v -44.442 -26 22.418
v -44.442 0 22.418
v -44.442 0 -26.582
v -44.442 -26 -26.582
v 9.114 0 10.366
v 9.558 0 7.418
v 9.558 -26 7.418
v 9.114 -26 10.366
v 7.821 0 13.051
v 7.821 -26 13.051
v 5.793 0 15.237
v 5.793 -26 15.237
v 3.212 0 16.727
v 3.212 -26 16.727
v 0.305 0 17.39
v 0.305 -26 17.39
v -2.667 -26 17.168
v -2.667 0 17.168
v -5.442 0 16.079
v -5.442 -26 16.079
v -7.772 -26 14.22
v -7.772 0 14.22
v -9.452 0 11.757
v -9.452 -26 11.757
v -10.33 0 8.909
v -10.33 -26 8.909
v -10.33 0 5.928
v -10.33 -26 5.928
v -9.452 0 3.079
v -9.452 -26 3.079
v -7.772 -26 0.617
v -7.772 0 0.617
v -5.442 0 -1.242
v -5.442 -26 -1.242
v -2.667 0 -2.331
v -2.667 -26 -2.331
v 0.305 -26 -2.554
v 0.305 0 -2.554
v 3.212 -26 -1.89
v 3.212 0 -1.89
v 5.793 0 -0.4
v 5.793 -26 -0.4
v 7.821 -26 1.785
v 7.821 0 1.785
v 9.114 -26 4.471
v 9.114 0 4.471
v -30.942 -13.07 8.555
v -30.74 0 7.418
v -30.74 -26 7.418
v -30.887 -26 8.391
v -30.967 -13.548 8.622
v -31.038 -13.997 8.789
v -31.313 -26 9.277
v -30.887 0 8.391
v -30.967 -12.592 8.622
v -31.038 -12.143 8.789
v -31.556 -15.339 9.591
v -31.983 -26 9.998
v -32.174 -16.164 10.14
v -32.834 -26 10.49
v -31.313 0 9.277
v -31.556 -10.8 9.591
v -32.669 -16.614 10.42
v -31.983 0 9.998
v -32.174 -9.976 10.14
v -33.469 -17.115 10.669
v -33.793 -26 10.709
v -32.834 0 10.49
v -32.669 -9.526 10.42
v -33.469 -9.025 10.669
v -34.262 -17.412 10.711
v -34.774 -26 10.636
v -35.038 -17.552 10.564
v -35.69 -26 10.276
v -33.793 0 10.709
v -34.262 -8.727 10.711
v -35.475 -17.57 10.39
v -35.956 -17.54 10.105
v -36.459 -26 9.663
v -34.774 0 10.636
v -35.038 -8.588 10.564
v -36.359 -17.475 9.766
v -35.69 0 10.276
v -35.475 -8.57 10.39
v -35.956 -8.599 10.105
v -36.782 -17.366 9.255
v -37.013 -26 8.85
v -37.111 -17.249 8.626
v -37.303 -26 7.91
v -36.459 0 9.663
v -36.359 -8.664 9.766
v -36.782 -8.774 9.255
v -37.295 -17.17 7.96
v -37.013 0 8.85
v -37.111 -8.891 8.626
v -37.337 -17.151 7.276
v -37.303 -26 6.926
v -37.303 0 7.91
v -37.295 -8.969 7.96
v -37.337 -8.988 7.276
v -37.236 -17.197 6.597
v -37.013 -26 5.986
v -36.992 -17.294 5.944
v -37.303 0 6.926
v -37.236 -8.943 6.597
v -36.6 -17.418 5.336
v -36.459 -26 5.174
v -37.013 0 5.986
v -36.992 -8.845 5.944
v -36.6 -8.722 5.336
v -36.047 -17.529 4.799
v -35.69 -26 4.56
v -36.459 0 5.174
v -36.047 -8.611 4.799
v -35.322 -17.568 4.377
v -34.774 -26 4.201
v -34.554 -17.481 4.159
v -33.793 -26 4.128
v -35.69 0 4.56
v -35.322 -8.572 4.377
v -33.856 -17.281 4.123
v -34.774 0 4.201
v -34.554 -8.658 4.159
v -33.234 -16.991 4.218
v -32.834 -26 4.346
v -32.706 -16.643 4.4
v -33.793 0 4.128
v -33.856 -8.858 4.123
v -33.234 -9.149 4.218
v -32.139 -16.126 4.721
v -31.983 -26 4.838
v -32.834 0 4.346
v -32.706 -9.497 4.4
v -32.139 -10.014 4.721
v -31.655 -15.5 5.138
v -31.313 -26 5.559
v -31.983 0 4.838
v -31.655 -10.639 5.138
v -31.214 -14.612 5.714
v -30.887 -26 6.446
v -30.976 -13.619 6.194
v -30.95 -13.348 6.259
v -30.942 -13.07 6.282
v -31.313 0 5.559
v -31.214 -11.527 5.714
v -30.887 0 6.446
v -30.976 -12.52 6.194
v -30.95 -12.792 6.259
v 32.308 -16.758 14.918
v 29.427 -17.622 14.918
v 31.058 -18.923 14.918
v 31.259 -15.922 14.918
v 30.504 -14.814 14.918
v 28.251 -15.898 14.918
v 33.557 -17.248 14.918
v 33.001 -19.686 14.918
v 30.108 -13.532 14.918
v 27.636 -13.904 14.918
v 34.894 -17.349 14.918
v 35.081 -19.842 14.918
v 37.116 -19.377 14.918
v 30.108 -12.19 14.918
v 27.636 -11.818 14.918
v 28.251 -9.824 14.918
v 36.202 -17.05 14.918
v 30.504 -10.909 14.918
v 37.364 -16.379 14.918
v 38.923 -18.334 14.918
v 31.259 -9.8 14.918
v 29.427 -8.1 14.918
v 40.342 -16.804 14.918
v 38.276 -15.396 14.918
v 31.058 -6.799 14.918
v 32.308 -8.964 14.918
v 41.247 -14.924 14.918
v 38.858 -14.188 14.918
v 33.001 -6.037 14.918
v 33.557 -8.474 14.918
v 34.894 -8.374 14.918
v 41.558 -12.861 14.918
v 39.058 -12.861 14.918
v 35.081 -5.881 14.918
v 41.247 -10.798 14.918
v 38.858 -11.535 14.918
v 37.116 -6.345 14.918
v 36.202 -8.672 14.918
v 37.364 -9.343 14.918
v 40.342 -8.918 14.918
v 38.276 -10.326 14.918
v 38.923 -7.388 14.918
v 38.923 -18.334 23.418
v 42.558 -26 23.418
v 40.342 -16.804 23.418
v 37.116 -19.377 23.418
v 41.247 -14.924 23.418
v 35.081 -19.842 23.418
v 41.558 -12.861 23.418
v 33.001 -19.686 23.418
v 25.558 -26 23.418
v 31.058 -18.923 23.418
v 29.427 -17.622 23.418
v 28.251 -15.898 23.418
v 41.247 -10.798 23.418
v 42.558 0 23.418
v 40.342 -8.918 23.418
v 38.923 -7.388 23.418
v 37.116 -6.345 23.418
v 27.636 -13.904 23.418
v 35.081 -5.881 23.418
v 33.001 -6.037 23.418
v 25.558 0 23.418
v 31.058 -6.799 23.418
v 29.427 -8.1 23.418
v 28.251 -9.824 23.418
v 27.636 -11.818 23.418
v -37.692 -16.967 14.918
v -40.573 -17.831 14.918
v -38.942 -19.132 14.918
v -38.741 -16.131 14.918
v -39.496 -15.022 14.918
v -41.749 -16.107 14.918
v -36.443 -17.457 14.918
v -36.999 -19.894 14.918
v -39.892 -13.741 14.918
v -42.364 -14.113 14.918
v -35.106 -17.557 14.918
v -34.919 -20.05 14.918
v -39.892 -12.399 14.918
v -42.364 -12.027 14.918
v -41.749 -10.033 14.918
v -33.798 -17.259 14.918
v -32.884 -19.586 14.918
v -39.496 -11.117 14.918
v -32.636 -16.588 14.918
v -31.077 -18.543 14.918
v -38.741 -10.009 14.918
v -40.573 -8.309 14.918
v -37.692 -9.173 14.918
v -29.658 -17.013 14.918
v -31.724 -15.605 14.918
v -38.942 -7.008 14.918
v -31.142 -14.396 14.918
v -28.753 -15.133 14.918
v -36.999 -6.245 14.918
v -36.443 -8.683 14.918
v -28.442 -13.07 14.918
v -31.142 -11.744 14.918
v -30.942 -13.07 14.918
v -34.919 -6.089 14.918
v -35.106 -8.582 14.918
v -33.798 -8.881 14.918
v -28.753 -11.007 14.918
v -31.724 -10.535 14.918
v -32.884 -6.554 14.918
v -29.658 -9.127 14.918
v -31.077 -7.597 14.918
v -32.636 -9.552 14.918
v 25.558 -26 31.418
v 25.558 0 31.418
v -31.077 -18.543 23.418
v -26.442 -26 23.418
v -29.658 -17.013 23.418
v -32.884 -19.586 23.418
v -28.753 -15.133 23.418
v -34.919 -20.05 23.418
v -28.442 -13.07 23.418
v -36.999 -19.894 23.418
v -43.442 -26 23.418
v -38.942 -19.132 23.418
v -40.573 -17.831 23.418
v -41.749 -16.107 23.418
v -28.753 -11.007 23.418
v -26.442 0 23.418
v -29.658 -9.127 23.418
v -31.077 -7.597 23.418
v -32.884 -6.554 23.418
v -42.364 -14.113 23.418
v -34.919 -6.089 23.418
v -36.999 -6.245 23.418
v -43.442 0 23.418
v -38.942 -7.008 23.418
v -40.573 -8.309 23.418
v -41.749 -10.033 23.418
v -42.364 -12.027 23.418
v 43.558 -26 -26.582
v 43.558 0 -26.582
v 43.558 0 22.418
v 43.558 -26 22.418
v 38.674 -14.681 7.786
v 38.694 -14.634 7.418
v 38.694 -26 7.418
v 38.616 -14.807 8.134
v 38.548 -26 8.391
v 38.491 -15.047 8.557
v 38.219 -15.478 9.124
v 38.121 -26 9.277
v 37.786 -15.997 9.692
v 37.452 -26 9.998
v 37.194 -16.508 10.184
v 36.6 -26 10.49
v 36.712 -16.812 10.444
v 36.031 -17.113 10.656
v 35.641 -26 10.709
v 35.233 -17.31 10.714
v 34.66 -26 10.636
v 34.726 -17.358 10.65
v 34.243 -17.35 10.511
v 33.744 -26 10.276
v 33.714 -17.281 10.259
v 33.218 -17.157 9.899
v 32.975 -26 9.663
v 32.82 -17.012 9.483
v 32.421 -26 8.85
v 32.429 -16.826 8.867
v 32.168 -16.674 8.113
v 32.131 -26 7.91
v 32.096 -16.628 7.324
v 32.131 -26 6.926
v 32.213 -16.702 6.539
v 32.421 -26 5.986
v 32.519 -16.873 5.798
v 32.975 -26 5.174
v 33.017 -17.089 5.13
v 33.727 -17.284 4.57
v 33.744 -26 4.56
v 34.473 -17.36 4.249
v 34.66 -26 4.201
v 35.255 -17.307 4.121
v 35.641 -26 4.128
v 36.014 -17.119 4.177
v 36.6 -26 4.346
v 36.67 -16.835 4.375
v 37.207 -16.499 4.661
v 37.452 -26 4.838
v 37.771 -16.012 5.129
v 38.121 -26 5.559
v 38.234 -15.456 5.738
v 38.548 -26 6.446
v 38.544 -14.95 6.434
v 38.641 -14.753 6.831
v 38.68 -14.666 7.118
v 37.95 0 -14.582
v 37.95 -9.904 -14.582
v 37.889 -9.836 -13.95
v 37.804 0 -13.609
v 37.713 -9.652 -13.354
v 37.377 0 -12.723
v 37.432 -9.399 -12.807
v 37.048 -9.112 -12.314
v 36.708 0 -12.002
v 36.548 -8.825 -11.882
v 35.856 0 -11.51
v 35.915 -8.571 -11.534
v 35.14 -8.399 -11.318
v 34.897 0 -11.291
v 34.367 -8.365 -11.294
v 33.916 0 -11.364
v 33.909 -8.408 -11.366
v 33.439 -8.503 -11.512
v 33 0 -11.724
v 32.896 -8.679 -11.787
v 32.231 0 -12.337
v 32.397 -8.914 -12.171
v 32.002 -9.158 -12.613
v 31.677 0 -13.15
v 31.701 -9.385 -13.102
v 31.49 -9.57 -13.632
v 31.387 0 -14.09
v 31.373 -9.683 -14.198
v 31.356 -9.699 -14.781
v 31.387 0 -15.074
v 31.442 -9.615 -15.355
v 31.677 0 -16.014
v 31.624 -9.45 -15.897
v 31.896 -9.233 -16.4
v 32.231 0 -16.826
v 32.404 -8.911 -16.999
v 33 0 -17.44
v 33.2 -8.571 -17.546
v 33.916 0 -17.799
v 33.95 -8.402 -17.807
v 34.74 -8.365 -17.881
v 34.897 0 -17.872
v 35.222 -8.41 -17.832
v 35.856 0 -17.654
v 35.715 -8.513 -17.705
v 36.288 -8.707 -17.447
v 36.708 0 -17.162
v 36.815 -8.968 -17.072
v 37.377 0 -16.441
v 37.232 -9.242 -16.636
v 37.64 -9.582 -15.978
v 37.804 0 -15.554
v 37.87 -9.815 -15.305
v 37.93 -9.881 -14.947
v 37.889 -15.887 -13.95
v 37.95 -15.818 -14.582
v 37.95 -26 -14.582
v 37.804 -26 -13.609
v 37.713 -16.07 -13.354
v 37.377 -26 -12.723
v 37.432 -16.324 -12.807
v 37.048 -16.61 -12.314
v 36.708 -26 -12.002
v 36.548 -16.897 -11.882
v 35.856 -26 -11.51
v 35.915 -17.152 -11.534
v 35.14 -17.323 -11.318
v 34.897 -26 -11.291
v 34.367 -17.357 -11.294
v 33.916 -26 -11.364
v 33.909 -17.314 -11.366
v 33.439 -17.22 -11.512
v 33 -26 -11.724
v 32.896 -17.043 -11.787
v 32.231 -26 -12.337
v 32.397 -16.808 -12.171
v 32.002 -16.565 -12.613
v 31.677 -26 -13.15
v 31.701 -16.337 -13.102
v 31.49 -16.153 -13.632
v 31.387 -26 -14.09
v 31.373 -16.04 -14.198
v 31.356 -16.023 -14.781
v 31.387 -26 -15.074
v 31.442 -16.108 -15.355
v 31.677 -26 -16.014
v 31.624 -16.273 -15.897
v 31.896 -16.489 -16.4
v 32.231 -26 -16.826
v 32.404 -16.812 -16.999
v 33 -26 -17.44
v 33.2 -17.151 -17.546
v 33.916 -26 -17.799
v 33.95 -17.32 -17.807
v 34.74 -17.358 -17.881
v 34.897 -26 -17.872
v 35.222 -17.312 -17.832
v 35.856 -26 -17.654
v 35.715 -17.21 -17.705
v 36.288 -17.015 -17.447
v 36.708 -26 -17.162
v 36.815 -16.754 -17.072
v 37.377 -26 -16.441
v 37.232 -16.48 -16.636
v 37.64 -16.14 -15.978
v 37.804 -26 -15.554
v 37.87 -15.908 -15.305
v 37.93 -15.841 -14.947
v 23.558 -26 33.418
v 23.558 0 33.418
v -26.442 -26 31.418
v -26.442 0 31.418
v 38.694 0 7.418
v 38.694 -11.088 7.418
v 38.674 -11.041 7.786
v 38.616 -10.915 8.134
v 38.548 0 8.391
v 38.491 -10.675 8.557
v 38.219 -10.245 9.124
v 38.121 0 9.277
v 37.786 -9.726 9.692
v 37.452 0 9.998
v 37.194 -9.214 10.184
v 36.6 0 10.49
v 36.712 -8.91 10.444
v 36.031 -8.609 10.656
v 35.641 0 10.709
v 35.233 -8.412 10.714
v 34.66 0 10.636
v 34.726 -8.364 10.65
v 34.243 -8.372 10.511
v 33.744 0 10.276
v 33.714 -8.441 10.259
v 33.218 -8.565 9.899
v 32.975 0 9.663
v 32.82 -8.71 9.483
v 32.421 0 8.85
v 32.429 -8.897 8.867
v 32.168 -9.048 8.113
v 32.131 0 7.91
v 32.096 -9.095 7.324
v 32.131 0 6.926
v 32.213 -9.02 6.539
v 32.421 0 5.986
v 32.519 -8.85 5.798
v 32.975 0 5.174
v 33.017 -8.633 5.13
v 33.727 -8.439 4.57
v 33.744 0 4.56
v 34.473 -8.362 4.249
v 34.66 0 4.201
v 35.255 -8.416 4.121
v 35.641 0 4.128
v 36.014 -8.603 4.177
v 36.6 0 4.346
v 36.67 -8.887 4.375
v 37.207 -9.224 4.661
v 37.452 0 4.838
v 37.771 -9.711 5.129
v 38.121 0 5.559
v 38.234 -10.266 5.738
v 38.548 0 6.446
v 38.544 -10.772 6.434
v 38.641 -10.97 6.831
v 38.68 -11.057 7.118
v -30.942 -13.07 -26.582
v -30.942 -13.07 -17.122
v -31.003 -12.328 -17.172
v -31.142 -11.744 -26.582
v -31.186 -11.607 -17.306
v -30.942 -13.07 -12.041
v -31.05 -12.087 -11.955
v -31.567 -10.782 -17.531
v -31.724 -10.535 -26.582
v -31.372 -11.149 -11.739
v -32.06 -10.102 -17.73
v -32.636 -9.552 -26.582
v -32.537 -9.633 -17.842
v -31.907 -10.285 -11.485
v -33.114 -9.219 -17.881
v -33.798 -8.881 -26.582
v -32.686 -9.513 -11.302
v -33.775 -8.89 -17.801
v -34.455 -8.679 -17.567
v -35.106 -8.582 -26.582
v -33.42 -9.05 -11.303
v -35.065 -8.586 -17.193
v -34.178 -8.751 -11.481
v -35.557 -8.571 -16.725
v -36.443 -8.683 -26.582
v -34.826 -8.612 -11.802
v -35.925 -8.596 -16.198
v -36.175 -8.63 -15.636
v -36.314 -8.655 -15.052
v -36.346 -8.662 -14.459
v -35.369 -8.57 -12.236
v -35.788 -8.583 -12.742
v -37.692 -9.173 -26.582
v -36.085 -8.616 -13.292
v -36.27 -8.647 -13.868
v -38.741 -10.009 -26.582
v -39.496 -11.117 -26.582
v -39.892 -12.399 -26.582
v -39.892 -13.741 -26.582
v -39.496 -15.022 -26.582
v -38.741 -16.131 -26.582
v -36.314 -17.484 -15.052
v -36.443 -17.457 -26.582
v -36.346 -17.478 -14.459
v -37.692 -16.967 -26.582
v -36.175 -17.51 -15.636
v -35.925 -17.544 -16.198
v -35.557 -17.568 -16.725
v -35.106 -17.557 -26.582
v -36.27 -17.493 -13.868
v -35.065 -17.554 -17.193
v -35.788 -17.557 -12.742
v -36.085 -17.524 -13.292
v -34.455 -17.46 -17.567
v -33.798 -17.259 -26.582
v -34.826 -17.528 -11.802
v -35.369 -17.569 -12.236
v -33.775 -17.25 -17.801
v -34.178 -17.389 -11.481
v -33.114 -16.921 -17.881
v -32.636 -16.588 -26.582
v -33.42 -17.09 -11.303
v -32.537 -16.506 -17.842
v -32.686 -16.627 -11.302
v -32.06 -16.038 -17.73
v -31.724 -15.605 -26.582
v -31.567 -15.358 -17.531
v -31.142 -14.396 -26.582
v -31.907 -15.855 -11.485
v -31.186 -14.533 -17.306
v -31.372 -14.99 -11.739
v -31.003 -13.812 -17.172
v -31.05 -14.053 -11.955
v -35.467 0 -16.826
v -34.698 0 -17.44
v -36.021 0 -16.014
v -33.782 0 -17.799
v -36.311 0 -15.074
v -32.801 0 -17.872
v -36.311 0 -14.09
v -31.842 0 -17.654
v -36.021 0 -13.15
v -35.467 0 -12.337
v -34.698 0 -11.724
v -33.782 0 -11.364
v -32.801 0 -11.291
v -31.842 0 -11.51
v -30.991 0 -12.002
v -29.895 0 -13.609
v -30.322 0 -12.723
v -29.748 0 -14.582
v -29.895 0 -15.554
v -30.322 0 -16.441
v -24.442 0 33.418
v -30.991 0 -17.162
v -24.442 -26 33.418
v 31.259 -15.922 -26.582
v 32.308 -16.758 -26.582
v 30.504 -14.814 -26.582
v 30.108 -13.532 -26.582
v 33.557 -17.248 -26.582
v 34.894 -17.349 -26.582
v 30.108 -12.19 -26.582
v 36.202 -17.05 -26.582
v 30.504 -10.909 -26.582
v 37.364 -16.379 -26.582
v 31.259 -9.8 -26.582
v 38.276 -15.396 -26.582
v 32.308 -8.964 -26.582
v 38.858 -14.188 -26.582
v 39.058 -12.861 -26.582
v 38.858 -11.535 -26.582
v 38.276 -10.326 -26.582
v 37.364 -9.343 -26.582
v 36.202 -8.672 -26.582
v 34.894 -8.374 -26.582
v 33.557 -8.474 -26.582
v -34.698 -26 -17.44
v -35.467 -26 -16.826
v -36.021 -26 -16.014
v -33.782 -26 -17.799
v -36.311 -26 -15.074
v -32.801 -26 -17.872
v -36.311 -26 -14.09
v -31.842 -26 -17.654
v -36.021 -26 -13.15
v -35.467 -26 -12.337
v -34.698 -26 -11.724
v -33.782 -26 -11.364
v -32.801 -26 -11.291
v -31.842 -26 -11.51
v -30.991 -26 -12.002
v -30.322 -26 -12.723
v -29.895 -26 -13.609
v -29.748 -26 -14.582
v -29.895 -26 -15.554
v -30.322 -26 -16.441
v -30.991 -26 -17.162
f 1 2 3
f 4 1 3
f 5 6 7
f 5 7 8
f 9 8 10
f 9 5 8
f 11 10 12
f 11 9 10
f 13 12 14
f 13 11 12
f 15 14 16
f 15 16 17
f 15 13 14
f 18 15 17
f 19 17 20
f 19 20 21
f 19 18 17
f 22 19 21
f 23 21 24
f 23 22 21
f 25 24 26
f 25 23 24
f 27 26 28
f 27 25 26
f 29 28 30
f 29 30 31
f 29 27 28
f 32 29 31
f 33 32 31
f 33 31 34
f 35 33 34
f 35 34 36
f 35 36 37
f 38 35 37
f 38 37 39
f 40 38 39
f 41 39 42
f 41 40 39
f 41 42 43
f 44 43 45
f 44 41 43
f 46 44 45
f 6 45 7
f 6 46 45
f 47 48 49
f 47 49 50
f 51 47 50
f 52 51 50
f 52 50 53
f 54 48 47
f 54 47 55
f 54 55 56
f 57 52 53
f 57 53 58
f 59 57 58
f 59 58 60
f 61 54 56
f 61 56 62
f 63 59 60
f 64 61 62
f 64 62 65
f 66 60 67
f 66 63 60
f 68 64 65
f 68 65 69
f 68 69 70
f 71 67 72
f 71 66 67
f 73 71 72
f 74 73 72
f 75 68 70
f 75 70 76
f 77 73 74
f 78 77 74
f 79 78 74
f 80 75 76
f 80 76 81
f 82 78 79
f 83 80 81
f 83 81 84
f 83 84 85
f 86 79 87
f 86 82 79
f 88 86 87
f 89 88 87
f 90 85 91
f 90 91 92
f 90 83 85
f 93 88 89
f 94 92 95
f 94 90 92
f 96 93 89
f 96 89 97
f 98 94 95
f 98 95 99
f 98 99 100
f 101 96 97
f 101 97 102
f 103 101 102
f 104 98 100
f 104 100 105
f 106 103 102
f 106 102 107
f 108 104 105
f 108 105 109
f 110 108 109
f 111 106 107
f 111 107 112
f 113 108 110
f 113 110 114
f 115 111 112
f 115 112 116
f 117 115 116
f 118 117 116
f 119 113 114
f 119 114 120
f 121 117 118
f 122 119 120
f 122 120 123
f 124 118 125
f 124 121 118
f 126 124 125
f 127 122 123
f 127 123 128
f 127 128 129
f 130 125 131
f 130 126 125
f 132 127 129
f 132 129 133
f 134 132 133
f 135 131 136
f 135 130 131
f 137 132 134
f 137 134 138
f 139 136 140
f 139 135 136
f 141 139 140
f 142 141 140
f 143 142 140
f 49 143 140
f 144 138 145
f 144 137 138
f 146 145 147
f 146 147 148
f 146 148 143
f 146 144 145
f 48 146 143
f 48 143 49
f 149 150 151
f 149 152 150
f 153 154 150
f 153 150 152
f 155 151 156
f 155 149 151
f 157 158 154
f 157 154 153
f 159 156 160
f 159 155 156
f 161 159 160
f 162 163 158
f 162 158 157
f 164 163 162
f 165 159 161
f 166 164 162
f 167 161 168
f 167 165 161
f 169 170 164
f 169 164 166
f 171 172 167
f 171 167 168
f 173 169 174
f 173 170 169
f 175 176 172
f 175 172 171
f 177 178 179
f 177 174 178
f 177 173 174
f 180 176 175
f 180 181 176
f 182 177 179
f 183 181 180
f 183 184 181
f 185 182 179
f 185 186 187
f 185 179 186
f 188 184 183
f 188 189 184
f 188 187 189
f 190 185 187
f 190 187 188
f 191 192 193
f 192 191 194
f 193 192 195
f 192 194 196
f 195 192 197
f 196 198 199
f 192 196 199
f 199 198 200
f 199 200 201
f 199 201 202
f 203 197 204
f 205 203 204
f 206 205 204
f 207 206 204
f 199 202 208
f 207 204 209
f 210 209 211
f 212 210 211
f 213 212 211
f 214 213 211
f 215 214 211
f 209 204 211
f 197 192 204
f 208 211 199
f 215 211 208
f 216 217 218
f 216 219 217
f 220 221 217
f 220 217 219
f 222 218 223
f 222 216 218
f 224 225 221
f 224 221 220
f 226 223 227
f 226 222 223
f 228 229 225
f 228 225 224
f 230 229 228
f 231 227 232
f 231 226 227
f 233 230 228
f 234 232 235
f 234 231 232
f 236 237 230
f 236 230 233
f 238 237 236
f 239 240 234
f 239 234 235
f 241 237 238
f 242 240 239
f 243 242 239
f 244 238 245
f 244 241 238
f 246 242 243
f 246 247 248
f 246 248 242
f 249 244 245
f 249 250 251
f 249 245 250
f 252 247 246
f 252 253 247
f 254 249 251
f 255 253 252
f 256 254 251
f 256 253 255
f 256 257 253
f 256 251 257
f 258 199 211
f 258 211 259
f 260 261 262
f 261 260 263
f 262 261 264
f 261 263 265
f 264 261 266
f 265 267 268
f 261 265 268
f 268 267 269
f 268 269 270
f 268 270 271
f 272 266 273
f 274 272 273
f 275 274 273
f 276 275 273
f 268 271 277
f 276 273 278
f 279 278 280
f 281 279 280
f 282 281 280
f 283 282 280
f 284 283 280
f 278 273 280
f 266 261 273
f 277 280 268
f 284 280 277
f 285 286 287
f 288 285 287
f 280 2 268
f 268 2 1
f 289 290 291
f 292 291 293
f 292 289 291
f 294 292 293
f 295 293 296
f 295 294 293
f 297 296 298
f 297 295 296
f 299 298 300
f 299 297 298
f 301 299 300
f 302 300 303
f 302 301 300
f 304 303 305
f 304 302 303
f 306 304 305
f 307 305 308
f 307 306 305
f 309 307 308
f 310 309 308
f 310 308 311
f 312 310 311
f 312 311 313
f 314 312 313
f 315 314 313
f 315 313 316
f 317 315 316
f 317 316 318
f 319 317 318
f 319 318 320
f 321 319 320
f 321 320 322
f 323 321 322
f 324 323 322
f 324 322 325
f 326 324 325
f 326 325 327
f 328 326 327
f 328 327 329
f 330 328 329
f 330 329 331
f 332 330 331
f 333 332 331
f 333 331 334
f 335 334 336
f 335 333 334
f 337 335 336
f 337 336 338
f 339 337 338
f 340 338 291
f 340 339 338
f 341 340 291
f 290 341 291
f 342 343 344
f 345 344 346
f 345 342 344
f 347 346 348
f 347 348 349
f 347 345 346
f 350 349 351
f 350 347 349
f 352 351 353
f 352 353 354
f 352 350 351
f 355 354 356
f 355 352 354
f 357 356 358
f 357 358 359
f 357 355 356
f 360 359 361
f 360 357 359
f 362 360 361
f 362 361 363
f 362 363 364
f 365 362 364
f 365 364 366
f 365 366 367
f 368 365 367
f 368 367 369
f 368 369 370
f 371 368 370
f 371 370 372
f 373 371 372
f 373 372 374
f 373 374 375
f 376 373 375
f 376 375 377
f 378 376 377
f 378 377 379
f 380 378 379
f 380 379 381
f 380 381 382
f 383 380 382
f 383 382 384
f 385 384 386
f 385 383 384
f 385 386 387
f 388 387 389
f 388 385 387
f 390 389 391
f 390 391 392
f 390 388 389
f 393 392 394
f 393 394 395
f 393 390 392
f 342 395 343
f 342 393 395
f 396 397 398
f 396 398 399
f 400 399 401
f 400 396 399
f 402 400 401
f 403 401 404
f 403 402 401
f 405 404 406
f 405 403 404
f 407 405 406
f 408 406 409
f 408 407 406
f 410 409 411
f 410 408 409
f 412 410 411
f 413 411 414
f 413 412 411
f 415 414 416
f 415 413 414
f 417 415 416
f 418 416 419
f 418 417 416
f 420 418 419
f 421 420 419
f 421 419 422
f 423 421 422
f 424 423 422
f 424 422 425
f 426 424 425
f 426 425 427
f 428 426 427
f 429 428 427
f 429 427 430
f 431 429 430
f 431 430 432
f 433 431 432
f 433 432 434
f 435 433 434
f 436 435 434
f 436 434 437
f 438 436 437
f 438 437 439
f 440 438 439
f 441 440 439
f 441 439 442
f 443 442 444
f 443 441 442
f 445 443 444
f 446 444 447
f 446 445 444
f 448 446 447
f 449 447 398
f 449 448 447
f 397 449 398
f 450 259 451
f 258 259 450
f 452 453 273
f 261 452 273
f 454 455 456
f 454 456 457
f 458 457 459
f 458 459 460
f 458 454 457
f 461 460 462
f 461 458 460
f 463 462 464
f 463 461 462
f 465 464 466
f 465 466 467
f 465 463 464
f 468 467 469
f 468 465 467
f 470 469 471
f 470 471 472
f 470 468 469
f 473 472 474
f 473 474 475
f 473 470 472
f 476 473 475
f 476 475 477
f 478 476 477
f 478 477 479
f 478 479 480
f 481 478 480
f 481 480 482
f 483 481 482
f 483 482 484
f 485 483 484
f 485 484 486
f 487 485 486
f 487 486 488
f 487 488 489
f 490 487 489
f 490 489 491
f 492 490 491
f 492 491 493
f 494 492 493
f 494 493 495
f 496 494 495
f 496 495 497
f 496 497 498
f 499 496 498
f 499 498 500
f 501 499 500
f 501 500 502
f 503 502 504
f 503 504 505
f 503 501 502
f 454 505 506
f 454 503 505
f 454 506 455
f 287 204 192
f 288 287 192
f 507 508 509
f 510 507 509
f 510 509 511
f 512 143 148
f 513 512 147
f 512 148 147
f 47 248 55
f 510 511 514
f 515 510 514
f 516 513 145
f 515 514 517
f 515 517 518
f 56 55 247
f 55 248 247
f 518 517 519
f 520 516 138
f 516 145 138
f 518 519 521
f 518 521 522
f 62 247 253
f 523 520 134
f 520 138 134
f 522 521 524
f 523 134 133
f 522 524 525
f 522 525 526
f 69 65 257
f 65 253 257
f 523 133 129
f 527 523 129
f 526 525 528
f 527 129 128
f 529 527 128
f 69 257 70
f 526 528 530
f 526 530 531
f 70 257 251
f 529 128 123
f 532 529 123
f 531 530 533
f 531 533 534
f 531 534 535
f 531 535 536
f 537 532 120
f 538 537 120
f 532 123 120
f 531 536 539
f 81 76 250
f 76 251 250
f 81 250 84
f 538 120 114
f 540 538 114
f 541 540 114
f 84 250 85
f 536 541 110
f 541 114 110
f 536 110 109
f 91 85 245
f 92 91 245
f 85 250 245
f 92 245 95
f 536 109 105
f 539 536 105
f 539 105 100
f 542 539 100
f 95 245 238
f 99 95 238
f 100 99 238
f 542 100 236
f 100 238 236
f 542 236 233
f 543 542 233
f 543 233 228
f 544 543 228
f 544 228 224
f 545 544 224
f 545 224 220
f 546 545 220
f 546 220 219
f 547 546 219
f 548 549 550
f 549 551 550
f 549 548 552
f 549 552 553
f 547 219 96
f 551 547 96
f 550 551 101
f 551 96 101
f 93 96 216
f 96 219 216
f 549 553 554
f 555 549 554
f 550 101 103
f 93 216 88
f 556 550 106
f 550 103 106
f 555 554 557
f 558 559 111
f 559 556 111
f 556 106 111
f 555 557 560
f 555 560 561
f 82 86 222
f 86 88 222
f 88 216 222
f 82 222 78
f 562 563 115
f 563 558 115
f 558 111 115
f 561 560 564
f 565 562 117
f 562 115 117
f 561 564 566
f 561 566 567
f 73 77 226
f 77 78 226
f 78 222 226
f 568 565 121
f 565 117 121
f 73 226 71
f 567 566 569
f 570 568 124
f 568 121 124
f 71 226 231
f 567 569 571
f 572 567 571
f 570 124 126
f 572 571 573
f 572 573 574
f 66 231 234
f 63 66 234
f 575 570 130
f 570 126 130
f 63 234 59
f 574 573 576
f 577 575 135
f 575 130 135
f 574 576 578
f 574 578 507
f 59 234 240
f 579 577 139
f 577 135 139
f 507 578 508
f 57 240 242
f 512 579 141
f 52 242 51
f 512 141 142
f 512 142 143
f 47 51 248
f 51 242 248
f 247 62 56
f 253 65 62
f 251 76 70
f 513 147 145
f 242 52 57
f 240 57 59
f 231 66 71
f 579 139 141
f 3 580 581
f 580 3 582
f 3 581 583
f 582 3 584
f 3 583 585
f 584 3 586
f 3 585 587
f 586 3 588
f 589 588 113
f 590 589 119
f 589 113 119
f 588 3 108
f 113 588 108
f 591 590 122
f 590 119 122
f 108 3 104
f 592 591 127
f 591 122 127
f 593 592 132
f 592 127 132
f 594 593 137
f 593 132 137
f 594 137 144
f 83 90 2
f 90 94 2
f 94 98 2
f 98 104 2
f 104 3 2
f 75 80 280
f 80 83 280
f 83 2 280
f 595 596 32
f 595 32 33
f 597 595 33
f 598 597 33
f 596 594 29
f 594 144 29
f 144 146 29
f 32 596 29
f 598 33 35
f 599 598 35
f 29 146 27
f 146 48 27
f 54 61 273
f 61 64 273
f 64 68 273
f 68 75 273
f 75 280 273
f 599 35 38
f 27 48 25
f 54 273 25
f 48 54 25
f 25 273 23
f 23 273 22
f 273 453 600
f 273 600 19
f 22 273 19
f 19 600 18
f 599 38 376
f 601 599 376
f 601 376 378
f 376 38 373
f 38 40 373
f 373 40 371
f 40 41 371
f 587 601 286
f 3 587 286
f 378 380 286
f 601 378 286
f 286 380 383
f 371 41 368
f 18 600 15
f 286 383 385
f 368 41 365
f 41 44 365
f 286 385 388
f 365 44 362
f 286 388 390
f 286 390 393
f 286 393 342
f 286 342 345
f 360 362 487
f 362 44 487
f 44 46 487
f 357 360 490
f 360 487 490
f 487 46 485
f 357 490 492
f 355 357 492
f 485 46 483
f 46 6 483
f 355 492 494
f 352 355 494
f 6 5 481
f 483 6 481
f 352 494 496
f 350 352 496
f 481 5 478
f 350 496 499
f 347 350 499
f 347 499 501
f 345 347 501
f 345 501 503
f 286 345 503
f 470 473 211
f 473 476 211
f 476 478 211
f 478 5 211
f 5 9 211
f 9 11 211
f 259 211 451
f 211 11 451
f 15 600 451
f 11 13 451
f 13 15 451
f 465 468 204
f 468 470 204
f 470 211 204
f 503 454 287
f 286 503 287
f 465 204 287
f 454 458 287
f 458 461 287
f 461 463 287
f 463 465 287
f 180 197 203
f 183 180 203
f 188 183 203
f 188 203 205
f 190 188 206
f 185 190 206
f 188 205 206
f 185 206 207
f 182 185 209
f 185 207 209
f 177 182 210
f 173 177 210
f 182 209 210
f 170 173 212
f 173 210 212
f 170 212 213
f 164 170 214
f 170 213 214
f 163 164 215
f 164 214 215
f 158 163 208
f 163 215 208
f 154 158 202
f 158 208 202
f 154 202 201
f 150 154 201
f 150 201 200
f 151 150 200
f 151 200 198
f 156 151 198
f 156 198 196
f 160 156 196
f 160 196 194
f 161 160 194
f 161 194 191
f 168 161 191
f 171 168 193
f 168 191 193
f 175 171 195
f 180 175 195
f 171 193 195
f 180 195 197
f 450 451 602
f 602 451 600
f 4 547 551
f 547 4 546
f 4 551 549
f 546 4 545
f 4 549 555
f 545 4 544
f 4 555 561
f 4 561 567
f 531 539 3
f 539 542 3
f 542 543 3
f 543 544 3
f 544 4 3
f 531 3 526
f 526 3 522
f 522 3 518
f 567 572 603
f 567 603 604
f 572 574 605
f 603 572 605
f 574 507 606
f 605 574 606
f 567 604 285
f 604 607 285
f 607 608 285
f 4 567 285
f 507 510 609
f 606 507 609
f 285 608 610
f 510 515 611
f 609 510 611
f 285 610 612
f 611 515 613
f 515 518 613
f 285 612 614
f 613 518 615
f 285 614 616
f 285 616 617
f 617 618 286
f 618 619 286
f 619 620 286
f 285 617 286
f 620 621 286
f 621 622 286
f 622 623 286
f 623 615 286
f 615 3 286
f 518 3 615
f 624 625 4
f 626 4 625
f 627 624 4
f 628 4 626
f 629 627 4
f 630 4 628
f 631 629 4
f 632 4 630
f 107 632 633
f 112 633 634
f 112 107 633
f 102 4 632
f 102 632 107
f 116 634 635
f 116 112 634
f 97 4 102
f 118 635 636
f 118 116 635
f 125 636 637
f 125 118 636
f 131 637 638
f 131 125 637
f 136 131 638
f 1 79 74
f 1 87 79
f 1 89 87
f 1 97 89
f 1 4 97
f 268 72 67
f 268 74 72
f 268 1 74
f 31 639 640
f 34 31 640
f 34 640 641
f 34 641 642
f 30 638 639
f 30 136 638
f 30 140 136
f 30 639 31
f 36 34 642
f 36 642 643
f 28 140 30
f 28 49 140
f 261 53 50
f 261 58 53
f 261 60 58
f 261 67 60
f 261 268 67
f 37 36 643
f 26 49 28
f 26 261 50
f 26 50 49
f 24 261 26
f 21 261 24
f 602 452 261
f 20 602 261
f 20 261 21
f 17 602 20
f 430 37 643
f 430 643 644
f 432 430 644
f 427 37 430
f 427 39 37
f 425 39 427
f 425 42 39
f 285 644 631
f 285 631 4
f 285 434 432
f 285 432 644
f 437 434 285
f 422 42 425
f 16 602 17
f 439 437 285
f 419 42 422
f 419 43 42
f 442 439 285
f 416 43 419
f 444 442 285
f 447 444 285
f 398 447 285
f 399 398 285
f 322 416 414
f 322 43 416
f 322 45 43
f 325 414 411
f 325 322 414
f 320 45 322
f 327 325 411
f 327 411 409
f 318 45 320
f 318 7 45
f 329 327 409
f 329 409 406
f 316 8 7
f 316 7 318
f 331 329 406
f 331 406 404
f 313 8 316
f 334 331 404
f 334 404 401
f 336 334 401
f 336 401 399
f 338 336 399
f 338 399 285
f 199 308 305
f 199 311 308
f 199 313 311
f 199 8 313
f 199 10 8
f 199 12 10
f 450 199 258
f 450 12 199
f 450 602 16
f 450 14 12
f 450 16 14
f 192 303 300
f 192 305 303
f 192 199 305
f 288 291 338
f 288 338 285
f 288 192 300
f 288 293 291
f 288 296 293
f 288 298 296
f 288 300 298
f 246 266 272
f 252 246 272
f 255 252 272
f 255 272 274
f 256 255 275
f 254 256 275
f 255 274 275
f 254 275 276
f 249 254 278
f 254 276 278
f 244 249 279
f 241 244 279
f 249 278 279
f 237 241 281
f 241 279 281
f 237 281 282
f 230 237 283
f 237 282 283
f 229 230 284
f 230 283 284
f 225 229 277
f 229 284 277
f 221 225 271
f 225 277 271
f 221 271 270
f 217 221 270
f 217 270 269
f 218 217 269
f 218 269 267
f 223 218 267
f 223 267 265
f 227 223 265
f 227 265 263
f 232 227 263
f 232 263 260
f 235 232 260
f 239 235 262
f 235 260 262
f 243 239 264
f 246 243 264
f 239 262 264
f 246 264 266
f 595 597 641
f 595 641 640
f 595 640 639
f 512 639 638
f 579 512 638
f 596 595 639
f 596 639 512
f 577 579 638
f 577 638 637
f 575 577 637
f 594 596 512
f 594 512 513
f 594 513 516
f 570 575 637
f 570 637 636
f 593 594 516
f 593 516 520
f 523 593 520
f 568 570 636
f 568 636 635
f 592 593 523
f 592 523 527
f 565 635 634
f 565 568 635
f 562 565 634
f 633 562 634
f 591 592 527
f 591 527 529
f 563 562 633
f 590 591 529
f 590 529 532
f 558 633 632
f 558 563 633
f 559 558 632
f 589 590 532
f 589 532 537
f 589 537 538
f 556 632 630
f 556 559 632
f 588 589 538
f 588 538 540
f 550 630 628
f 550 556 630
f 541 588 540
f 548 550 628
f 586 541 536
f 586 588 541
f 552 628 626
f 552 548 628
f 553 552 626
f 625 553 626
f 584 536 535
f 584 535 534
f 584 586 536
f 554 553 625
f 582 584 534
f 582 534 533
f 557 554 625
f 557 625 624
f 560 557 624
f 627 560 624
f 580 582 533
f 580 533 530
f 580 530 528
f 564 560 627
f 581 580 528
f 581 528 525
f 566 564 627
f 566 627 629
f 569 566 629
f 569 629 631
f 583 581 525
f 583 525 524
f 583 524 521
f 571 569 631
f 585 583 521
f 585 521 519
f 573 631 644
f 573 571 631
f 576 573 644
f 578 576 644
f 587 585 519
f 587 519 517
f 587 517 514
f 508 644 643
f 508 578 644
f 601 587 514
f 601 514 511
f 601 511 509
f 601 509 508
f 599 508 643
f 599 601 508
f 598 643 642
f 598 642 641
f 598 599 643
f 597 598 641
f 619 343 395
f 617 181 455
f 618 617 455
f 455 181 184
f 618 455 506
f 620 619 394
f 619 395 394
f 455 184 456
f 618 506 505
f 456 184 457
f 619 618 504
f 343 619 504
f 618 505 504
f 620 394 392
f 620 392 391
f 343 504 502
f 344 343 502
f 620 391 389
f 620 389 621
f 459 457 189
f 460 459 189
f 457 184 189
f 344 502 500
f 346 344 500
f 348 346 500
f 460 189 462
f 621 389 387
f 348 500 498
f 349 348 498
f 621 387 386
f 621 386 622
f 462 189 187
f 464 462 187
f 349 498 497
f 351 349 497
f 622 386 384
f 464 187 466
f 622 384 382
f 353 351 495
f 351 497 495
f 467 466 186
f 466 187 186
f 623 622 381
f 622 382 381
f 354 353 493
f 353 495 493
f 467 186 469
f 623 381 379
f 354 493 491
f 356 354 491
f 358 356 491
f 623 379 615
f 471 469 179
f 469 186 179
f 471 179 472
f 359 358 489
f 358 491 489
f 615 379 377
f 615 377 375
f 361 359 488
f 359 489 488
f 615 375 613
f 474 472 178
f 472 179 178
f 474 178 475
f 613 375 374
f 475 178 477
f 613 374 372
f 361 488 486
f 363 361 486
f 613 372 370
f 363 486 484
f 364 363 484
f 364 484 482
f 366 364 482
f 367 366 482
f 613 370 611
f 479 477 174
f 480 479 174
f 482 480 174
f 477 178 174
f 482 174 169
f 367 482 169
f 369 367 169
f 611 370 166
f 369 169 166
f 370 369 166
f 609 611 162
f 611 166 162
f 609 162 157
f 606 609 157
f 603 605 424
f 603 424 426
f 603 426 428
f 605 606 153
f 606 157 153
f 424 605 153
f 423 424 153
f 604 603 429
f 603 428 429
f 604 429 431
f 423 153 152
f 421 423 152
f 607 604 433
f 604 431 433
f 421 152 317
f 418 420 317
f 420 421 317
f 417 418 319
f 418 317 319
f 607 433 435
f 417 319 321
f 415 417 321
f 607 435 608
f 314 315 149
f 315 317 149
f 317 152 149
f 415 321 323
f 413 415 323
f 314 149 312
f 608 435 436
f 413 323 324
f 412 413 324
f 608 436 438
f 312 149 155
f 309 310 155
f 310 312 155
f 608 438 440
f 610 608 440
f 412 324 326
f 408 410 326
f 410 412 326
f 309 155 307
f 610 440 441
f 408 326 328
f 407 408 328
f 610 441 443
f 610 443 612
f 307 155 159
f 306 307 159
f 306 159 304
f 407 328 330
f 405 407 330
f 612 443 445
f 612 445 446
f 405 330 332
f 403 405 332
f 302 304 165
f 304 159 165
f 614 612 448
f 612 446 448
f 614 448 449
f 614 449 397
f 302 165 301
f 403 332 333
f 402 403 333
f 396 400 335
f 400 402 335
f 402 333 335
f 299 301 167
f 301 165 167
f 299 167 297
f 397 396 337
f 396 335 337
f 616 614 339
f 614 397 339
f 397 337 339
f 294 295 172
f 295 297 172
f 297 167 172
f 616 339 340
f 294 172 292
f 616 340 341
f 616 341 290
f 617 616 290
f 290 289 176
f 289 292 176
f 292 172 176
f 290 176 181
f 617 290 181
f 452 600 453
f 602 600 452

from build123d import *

# Parameters (mm, degrees)
F0_R     = 3.3
F0_R_2   = 10
F1_DEPTH = 26
F2_SIZE  = 1
F3_SIZE  = 2
F4_R     = 7
F4_R_2   = 4.5
F5_DEPTH = 8.5
F6_DEPTH = 50.001


with BuildPart() as f1:
    # F0 (on Front) → F1 (new body)
    with BuildSketch(Plane.XZ):
        Polygon((-26.441849, 23.418281), (-44.441849, 23.418281), (-44.441849, -26.581719), (43.558151, -26.581719), (43.558151, 23.418281), (25.558151, 23.418281), (25.558151, 33.418281), (-26.441849, 33.418281), align=None)
        with Locations((-33.048104, -14.581719)):
            Circle(F0_R, mode=Mode.SUBTRACT)
        with Locations((34.650207, -14.581719)):
            Circle(F0_R, mode=Mode.SUBTRACT)
        with Locations((-34.040019, 7.418281)):
            Circle(F0_R, mode=Mode.SUBTRACT)
        with Locations((-0.441849, 7.418281)):
            Circle(F0_R_2, mode=Mode.SUBTRACT)
        with Locations((35.394143, 7.418281)):
            Circle(F0_R, mode=Mode.SUBTRACT)
    extrude(amount=F1_DEPTH)

    # F2
    f2_edges = [f1.edges().sort_by_distance(p)[0] for p in [
        (-44.441849, -13, 23.418281),
        (43.558151, -13, 23.418281),
    ]]
    chamfer(f2_edges, length=F2_SIZE)

    # F3
    f3_edges = [f1.edges().sort_by_distance(p)[0] for p in [
        (-26.441849, -13, 33.418281),
        (25.558151, -13, 33.418281),
    ]]
    chamfer(f3_edges, length=F3_SIZE)

    # F4 (on face) → F5 (cut)
    with BuildSketch(Plane.XY.offset(23.418281)):
        with Locations((-35.441849, -13.069903)):
            Circle(F4_R)
        with Locations((-35.441849, -13.069903)):
            Circle(F4_R_2, mode=Mode.SUBTRACT)
        with Locations((34.558151, -12.861175)):
            Circle(F4_R)
        with Locations((34.558151, -12.861175)):
            Circle(F4_R_2, mode=Mode.SUBTRACT)
    extrude(amount=-F5_DEPTH, mode=Mode.SUBTRACT)

    # F4 (on face) → F6 (cut, through all)
    with BuildSketch(Plane.XY.offset(23.418281)):
        with Locations((-35.441849, -13.069903)):
            Circle(F4_R_2)
        with Locations((34.558151, -12.861175)):
            Circle(F4_R_2)
    extrude(amount=-F6_DEPTH, mode=Mode.SUBTRACT)


solid = f1.part
